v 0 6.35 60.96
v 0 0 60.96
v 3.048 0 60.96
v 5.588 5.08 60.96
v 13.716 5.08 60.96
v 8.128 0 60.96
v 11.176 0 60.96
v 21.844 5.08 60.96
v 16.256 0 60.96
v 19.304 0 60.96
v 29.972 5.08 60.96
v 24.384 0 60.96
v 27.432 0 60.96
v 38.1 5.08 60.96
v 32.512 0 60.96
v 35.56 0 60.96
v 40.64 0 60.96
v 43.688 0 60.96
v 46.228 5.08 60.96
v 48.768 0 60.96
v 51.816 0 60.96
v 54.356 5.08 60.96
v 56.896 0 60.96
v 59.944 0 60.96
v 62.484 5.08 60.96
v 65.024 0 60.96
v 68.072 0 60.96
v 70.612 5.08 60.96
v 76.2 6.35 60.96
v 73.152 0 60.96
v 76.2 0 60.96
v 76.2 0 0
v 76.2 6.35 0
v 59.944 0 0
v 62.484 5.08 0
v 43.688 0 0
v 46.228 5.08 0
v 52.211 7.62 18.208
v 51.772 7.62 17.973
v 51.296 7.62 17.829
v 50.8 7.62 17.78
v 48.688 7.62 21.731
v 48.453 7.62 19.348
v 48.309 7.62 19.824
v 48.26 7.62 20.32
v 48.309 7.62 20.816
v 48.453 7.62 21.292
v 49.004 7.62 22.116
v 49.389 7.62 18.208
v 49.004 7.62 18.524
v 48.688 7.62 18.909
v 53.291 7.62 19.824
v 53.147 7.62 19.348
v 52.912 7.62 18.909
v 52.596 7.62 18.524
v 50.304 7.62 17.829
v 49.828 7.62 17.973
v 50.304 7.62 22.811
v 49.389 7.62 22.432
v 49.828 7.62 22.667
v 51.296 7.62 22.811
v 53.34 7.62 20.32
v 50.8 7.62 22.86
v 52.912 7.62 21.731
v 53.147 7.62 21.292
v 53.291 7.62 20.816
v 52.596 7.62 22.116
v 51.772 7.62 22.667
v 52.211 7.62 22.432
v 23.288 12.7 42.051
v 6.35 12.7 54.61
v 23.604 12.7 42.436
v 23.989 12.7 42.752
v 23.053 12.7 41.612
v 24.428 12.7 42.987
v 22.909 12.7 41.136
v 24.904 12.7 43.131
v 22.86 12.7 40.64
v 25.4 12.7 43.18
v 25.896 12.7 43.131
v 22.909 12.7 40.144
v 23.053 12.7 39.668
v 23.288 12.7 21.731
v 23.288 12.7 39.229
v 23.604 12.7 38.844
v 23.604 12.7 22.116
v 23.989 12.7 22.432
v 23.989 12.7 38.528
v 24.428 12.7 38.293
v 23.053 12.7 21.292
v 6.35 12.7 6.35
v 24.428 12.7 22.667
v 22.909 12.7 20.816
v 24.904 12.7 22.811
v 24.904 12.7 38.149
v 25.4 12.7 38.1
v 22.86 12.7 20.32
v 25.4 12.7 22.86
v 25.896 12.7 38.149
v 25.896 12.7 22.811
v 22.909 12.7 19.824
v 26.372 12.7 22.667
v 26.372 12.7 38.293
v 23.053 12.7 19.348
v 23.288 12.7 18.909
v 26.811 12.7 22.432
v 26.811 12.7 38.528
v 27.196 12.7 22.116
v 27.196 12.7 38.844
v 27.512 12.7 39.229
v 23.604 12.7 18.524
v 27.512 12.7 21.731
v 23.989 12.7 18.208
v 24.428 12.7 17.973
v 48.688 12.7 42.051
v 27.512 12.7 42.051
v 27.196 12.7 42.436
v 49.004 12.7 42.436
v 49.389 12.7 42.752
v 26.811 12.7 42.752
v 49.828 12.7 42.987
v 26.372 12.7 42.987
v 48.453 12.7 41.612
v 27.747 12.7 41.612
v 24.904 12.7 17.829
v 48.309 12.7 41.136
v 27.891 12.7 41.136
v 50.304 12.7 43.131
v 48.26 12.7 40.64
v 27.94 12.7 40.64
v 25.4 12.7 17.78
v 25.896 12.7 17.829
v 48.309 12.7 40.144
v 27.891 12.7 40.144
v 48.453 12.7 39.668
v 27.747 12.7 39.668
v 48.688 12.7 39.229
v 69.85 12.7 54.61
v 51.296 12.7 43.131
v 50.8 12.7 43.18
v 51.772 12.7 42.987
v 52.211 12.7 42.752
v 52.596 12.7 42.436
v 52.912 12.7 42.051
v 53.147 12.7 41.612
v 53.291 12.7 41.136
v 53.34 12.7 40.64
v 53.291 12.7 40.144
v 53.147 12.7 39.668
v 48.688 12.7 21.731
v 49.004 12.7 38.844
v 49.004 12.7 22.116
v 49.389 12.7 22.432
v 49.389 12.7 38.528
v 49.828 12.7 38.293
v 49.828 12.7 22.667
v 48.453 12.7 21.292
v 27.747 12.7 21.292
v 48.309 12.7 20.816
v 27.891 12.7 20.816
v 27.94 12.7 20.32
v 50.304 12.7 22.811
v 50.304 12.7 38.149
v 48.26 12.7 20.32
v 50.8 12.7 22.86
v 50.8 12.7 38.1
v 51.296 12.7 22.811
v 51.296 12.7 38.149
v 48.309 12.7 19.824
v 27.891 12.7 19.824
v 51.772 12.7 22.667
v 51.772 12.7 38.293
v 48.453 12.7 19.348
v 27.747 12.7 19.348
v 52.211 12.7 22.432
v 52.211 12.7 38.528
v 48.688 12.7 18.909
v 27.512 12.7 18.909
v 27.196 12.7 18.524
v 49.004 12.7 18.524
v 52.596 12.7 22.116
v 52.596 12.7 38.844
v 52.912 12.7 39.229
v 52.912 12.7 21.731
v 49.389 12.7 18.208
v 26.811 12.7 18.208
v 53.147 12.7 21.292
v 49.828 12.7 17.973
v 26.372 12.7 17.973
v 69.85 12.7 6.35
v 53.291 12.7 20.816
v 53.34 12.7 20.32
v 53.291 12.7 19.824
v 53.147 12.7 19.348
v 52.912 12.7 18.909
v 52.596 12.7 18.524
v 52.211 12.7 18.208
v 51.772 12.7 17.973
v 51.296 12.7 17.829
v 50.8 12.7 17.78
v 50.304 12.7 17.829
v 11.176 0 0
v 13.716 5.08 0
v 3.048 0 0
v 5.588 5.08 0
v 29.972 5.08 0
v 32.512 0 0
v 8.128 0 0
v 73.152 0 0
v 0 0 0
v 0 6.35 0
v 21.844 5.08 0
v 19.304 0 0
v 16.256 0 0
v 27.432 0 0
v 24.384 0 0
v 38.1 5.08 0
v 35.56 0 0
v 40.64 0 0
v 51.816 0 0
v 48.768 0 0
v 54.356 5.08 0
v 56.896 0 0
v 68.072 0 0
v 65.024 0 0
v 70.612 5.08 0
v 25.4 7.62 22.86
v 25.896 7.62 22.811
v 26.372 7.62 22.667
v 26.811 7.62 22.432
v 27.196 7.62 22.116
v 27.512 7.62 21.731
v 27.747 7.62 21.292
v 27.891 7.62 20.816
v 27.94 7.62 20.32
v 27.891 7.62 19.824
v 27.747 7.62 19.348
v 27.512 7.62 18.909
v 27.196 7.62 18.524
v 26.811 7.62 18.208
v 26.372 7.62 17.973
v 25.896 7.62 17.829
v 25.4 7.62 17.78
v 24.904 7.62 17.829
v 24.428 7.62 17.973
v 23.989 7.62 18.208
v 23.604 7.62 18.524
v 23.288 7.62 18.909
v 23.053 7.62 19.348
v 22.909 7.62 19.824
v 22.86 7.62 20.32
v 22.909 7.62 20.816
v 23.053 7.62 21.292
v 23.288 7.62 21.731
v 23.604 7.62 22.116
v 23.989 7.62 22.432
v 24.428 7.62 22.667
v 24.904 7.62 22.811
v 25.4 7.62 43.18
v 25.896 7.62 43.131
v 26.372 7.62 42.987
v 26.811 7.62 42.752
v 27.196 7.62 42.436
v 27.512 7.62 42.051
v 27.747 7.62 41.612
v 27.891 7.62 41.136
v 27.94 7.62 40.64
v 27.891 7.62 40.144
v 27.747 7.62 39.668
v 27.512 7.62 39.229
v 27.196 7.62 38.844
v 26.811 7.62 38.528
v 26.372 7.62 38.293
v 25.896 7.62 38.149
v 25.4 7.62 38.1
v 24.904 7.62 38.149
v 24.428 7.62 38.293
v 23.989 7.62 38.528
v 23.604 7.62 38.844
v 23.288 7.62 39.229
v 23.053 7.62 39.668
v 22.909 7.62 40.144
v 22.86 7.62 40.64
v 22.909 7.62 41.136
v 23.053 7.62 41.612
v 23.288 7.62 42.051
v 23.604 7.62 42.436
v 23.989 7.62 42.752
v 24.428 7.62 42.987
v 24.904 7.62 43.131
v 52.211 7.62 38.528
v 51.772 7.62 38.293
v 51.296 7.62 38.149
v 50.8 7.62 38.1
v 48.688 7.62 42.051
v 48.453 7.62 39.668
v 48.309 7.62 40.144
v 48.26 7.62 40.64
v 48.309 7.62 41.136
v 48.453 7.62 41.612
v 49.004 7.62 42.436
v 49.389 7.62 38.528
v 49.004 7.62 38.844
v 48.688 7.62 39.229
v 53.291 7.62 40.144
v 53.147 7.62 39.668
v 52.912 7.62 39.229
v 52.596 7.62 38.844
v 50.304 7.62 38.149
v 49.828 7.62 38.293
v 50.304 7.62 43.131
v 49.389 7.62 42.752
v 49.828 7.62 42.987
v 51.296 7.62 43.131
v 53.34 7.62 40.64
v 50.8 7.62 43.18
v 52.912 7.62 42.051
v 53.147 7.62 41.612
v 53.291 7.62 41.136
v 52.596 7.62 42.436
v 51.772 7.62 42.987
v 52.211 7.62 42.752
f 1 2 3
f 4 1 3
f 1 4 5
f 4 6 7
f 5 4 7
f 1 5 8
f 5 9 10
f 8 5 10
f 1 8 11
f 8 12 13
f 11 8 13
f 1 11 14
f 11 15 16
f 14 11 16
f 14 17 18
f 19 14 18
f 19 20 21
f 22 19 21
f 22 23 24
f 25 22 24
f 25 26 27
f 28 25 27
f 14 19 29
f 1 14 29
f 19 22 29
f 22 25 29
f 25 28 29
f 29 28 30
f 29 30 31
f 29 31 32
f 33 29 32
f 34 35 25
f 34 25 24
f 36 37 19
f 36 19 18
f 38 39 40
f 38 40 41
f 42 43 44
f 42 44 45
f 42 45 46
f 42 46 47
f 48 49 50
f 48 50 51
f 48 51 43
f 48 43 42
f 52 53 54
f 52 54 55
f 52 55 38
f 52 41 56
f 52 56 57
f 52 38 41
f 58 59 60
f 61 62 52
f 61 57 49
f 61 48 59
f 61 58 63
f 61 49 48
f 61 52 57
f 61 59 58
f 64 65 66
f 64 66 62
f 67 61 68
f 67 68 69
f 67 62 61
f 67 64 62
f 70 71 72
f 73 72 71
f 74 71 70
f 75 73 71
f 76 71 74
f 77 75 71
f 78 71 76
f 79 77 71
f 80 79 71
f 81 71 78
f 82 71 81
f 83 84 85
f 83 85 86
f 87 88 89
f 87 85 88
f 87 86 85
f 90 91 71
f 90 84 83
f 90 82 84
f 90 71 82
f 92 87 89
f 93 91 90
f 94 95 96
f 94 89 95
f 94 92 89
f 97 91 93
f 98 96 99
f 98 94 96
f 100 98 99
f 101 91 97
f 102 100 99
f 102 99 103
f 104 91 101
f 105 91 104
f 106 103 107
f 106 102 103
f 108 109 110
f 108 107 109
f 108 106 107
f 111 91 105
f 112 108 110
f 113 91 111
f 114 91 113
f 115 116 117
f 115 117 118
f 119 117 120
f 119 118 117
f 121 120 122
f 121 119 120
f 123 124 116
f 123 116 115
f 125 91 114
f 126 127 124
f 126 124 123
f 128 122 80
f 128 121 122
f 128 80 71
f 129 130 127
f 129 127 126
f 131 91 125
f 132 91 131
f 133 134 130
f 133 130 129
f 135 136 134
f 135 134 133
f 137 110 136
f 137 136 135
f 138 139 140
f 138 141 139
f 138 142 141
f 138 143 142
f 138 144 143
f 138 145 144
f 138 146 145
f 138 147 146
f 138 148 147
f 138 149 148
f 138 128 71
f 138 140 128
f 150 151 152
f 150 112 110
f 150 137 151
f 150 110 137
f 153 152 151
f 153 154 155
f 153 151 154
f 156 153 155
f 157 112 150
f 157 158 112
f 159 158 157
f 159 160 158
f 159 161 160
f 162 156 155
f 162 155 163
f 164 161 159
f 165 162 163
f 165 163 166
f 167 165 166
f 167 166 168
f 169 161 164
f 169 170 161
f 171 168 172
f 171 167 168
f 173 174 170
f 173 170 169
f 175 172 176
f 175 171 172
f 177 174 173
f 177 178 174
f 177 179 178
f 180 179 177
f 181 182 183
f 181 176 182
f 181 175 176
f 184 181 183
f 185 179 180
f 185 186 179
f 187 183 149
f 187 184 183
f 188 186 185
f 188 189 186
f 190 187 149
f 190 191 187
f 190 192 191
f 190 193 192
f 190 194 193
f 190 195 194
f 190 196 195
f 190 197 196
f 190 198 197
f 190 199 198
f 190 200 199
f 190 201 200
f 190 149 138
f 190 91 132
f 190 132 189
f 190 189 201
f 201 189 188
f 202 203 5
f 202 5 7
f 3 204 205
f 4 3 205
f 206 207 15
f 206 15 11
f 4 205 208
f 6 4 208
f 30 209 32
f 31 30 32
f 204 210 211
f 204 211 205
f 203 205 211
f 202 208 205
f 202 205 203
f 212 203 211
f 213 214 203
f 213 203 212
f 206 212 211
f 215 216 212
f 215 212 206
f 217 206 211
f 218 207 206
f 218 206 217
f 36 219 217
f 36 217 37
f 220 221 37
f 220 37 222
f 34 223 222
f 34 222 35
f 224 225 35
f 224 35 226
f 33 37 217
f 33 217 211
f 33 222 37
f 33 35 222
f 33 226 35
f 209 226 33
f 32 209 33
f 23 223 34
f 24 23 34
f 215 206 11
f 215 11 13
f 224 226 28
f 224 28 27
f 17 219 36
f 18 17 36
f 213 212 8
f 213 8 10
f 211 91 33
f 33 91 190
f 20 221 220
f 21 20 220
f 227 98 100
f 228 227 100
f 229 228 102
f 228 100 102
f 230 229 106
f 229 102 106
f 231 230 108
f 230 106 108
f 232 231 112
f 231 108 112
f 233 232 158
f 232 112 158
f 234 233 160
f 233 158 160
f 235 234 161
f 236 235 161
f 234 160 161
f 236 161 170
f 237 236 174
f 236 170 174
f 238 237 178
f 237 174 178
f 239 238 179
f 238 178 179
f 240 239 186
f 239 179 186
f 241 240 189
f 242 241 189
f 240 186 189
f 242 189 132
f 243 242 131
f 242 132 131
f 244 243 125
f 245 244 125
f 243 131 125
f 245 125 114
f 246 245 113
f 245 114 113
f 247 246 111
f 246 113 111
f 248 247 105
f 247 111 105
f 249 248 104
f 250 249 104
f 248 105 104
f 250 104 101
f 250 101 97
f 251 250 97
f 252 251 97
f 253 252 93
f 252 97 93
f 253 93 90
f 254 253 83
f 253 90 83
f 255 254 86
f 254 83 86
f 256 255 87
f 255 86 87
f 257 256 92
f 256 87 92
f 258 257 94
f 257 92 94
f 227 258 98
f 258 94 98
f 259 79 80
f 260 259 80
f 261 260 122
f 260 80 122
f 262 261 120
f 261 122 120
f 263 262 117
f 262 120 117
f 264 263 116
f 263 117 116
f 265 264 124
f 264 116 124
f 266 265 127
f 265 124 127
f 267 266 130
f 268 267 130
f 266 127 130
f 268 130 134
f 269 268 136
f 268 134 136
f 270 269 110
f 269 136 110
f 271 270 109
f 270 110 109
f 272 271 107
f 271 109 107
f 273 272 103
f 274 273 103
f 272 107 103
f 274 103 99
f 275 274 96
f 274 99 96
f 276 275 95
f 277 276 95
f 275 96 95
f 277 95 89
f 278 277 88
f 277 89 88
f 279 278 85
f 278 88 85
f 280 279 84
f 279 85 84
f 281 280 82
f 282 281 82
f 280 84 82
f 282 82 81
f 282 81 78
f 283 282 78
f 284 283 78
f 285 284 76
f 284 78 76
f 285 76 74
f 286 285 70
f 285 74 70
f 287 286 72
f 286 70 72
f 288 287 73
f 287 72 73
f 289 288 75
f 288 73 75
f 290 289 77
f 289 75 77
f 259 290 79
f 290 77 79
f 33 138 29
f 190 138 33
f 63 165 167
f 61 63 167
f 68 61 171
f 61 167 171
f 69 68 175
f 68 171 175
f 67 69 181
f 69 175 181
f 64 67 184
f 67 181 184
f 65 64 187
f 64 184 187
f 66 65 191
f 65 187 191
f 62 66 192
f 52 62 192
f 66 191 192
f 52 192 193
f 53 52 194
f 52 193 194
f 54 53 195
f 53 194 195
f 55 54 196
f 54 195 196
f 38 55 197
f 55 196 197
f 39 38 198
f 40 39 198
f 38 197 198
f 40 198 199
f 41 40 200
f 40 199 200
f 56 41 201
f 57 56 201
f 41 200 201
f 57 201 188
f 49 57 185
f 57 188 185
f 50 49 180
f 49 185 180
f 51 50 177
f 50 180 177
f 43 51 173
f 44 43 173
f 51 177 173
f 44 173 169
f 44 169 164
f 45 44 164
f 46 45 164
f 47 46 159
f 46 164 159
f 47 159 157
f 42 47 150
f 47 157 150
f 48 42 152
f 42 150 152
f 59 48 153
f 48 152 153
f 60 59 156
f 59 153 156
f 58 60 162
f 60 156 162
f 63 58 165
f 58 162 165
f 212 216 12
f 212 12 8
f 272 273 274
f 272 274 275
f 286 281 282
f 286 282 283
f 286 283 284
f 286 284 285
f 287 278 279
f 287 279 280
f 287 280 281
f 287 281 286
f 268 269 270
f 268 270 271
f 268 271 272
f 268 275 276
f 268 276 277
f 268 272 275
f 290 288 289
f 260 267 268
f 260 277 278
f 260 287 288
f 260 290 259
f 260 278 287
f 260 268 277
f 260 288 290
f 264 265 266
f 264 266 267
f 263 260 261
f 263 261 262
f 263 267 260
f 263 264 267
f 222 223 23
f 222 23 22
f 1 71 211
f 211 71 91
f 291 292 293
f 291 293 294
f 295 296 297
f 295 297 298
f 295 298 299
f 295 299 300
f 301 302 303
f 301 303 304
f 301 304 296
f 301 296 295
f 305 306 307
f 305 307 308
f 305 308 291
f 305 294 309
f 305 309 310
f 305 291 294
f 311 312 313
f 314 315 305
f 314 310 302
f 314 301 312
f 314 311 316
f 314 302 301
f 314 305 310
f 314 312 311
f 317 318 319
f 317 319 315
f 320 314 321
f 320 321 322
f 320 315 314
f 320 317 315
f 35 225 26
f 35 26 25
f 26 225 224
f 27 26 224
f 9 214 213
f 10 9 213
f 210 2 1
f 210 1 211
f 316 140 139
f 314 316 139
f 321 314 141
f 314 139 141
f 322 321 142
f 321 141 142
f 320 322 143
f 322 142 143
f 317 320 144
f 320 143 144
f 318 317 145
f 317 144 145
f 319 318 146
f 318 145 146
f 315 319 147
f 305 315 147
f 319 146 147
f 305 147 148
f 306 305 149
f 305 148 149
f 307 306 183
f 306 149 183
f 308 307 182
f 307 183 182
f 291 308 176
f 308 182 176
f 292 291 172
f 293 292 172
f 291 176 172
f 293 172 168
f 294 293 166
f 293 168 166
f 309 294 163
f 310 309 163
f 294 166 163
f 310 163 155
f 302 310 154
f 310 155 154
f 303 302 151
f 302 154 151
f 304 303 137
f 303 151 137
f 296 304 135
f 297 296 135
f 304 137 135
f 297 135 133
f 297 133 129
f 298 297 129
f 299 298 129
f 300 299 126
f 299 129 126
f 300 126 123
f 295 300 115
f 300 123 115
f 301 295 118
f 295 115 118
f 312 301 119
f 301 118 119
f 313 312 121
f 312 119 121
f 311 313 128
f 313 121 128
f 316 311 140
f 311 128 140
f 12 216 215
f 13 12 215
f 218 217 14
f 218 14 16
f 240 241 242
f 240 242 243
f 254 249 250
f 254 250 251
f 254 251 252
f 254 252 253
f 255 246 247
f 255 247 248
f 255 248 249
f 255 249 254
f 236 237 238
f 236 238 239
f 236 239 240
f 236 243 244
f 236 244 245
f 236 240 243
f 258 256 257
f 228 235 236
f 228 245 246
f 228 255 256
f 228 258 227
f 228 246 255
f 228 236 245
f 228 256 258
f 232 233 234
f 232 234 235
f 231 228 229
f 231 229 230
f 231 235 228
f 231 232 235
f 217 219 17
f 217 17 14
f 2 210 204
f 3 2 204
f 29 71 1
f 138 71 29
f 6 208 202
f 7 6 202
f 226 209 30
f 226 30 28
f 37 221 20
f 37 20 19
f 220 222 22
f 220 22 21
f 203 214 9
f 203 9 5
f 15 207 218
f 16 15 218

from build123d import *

# Parameters (mm, degrees)
SKETCH1_W           = 76.2
SKETCH1_H           = 60.96
BOSS_EXTRUDE1_DEPTH = 12.7
CHAMFER1_SIZE       = 6.35
CUT_EXTRUDE1_DEPTH  = 99.406562789
CRVPATTERN1_DEPTH   = 60.96
SKETCH3_R           = 2.54
CUT_EXTRUDE2_DEPTH  = 5.08


# Read off the part's stored shape, not the designer's step: CrvPattern1
with BuildPart() as part:
    # Sketch1 → Boss-Extrude1 (new body)
    with BuildSketch(Plane(origin=(0, 0, 0), x_dir=(1, 0, 0), z_dir=(0, 1, 0))):
        with Locations((38.1, -30.48)):
            Rectangle(SKETCH1_W, SKETCH1_H)
    extrude(amount=BOSS_EXTRUDE1_DEPTH)

    # Chamfer1
    chamfer1_edges = [part.edges().sort_by_distance(p)[0] for p in [
        (76.2, 12.7, 30.48),
        (38.1, 12.7, 0),
        (0, 12.7, 30.48),
        (38.1, 12.7, 60.96),
    ]]
    chamfer(chamfer1_edges, length=CHAMFER1_SIZE)

    # Sketch2 → Cut-Extrude1 (cut, through all)
    with BuildSketch(Plane.XY.offset(60.96)):
        Polygon((3.048, 0), (5.588, 5.08), (8.128, 0), align=None)
    extrude(amount=-CUT_EXTRUDE1_DEPTH, mode=Mode.SUBTRACT)

    # CrvPattern1 outline → CrvPattern1 (cut)
    with BuildSketch(Plane.XY):
        Polygon((70.612, 5.08), (68.072, 0), (73.152, 0), align=None)
        Polygon((62.484, 5.08), (59.944, 0), (65.024, 0), align=None)
        Polygon((54.356, 5.08), (51.816, 0), (56.896, 0), align=None)
        Polygon((46.228, 5.08), (43.688, 0), (48.768, 0), align=None)
        Polygon((38.1, 5.08), (35.56, 0), (40.64, 0), align=None)
        Polygon((29.972, 5.08), (27.432, 0), (32.512, 0), align=None)
        Polygon((21.844, 5.08), (19.304, 0), (24.384, 0), align=None)
        Polygon((13.716, 5.08), (11.176, 0), (16.256, 0), align=None)
    extrude(amount=CRVPATTERN1_DEPTH, mode=Mode.SUBTRACT)

    # Sketch3 → Cut-Extrude2 (cut)
    with BuildSketch(Plane(origin=(0, 12.7, 0), x_dir=(1, 0, 0), z_dir=(0, 1, 0))):
        with Locations(Location((25.4, -20.32, 0), (0, 0, 270))):
            Circle(SKETCH3_R)
        with Locations(Location((50.8, -20.32, 0), (0, 0, 270))):
            Circle(SKETCH3_R)
        with Locations(Location((25.4, -40.64, 0), (0, 0, 270))):
            Circle(SKETCH3_R)
        with Locations(Location((50.8, -40.64, 0), (0, 0, 270))):
            Circle(SKETCH3_R)
    extrude(amount=-CUT_EXTRUDE2_DEPTH, mode=Mode.SUBTRACT)


solid = part.part
